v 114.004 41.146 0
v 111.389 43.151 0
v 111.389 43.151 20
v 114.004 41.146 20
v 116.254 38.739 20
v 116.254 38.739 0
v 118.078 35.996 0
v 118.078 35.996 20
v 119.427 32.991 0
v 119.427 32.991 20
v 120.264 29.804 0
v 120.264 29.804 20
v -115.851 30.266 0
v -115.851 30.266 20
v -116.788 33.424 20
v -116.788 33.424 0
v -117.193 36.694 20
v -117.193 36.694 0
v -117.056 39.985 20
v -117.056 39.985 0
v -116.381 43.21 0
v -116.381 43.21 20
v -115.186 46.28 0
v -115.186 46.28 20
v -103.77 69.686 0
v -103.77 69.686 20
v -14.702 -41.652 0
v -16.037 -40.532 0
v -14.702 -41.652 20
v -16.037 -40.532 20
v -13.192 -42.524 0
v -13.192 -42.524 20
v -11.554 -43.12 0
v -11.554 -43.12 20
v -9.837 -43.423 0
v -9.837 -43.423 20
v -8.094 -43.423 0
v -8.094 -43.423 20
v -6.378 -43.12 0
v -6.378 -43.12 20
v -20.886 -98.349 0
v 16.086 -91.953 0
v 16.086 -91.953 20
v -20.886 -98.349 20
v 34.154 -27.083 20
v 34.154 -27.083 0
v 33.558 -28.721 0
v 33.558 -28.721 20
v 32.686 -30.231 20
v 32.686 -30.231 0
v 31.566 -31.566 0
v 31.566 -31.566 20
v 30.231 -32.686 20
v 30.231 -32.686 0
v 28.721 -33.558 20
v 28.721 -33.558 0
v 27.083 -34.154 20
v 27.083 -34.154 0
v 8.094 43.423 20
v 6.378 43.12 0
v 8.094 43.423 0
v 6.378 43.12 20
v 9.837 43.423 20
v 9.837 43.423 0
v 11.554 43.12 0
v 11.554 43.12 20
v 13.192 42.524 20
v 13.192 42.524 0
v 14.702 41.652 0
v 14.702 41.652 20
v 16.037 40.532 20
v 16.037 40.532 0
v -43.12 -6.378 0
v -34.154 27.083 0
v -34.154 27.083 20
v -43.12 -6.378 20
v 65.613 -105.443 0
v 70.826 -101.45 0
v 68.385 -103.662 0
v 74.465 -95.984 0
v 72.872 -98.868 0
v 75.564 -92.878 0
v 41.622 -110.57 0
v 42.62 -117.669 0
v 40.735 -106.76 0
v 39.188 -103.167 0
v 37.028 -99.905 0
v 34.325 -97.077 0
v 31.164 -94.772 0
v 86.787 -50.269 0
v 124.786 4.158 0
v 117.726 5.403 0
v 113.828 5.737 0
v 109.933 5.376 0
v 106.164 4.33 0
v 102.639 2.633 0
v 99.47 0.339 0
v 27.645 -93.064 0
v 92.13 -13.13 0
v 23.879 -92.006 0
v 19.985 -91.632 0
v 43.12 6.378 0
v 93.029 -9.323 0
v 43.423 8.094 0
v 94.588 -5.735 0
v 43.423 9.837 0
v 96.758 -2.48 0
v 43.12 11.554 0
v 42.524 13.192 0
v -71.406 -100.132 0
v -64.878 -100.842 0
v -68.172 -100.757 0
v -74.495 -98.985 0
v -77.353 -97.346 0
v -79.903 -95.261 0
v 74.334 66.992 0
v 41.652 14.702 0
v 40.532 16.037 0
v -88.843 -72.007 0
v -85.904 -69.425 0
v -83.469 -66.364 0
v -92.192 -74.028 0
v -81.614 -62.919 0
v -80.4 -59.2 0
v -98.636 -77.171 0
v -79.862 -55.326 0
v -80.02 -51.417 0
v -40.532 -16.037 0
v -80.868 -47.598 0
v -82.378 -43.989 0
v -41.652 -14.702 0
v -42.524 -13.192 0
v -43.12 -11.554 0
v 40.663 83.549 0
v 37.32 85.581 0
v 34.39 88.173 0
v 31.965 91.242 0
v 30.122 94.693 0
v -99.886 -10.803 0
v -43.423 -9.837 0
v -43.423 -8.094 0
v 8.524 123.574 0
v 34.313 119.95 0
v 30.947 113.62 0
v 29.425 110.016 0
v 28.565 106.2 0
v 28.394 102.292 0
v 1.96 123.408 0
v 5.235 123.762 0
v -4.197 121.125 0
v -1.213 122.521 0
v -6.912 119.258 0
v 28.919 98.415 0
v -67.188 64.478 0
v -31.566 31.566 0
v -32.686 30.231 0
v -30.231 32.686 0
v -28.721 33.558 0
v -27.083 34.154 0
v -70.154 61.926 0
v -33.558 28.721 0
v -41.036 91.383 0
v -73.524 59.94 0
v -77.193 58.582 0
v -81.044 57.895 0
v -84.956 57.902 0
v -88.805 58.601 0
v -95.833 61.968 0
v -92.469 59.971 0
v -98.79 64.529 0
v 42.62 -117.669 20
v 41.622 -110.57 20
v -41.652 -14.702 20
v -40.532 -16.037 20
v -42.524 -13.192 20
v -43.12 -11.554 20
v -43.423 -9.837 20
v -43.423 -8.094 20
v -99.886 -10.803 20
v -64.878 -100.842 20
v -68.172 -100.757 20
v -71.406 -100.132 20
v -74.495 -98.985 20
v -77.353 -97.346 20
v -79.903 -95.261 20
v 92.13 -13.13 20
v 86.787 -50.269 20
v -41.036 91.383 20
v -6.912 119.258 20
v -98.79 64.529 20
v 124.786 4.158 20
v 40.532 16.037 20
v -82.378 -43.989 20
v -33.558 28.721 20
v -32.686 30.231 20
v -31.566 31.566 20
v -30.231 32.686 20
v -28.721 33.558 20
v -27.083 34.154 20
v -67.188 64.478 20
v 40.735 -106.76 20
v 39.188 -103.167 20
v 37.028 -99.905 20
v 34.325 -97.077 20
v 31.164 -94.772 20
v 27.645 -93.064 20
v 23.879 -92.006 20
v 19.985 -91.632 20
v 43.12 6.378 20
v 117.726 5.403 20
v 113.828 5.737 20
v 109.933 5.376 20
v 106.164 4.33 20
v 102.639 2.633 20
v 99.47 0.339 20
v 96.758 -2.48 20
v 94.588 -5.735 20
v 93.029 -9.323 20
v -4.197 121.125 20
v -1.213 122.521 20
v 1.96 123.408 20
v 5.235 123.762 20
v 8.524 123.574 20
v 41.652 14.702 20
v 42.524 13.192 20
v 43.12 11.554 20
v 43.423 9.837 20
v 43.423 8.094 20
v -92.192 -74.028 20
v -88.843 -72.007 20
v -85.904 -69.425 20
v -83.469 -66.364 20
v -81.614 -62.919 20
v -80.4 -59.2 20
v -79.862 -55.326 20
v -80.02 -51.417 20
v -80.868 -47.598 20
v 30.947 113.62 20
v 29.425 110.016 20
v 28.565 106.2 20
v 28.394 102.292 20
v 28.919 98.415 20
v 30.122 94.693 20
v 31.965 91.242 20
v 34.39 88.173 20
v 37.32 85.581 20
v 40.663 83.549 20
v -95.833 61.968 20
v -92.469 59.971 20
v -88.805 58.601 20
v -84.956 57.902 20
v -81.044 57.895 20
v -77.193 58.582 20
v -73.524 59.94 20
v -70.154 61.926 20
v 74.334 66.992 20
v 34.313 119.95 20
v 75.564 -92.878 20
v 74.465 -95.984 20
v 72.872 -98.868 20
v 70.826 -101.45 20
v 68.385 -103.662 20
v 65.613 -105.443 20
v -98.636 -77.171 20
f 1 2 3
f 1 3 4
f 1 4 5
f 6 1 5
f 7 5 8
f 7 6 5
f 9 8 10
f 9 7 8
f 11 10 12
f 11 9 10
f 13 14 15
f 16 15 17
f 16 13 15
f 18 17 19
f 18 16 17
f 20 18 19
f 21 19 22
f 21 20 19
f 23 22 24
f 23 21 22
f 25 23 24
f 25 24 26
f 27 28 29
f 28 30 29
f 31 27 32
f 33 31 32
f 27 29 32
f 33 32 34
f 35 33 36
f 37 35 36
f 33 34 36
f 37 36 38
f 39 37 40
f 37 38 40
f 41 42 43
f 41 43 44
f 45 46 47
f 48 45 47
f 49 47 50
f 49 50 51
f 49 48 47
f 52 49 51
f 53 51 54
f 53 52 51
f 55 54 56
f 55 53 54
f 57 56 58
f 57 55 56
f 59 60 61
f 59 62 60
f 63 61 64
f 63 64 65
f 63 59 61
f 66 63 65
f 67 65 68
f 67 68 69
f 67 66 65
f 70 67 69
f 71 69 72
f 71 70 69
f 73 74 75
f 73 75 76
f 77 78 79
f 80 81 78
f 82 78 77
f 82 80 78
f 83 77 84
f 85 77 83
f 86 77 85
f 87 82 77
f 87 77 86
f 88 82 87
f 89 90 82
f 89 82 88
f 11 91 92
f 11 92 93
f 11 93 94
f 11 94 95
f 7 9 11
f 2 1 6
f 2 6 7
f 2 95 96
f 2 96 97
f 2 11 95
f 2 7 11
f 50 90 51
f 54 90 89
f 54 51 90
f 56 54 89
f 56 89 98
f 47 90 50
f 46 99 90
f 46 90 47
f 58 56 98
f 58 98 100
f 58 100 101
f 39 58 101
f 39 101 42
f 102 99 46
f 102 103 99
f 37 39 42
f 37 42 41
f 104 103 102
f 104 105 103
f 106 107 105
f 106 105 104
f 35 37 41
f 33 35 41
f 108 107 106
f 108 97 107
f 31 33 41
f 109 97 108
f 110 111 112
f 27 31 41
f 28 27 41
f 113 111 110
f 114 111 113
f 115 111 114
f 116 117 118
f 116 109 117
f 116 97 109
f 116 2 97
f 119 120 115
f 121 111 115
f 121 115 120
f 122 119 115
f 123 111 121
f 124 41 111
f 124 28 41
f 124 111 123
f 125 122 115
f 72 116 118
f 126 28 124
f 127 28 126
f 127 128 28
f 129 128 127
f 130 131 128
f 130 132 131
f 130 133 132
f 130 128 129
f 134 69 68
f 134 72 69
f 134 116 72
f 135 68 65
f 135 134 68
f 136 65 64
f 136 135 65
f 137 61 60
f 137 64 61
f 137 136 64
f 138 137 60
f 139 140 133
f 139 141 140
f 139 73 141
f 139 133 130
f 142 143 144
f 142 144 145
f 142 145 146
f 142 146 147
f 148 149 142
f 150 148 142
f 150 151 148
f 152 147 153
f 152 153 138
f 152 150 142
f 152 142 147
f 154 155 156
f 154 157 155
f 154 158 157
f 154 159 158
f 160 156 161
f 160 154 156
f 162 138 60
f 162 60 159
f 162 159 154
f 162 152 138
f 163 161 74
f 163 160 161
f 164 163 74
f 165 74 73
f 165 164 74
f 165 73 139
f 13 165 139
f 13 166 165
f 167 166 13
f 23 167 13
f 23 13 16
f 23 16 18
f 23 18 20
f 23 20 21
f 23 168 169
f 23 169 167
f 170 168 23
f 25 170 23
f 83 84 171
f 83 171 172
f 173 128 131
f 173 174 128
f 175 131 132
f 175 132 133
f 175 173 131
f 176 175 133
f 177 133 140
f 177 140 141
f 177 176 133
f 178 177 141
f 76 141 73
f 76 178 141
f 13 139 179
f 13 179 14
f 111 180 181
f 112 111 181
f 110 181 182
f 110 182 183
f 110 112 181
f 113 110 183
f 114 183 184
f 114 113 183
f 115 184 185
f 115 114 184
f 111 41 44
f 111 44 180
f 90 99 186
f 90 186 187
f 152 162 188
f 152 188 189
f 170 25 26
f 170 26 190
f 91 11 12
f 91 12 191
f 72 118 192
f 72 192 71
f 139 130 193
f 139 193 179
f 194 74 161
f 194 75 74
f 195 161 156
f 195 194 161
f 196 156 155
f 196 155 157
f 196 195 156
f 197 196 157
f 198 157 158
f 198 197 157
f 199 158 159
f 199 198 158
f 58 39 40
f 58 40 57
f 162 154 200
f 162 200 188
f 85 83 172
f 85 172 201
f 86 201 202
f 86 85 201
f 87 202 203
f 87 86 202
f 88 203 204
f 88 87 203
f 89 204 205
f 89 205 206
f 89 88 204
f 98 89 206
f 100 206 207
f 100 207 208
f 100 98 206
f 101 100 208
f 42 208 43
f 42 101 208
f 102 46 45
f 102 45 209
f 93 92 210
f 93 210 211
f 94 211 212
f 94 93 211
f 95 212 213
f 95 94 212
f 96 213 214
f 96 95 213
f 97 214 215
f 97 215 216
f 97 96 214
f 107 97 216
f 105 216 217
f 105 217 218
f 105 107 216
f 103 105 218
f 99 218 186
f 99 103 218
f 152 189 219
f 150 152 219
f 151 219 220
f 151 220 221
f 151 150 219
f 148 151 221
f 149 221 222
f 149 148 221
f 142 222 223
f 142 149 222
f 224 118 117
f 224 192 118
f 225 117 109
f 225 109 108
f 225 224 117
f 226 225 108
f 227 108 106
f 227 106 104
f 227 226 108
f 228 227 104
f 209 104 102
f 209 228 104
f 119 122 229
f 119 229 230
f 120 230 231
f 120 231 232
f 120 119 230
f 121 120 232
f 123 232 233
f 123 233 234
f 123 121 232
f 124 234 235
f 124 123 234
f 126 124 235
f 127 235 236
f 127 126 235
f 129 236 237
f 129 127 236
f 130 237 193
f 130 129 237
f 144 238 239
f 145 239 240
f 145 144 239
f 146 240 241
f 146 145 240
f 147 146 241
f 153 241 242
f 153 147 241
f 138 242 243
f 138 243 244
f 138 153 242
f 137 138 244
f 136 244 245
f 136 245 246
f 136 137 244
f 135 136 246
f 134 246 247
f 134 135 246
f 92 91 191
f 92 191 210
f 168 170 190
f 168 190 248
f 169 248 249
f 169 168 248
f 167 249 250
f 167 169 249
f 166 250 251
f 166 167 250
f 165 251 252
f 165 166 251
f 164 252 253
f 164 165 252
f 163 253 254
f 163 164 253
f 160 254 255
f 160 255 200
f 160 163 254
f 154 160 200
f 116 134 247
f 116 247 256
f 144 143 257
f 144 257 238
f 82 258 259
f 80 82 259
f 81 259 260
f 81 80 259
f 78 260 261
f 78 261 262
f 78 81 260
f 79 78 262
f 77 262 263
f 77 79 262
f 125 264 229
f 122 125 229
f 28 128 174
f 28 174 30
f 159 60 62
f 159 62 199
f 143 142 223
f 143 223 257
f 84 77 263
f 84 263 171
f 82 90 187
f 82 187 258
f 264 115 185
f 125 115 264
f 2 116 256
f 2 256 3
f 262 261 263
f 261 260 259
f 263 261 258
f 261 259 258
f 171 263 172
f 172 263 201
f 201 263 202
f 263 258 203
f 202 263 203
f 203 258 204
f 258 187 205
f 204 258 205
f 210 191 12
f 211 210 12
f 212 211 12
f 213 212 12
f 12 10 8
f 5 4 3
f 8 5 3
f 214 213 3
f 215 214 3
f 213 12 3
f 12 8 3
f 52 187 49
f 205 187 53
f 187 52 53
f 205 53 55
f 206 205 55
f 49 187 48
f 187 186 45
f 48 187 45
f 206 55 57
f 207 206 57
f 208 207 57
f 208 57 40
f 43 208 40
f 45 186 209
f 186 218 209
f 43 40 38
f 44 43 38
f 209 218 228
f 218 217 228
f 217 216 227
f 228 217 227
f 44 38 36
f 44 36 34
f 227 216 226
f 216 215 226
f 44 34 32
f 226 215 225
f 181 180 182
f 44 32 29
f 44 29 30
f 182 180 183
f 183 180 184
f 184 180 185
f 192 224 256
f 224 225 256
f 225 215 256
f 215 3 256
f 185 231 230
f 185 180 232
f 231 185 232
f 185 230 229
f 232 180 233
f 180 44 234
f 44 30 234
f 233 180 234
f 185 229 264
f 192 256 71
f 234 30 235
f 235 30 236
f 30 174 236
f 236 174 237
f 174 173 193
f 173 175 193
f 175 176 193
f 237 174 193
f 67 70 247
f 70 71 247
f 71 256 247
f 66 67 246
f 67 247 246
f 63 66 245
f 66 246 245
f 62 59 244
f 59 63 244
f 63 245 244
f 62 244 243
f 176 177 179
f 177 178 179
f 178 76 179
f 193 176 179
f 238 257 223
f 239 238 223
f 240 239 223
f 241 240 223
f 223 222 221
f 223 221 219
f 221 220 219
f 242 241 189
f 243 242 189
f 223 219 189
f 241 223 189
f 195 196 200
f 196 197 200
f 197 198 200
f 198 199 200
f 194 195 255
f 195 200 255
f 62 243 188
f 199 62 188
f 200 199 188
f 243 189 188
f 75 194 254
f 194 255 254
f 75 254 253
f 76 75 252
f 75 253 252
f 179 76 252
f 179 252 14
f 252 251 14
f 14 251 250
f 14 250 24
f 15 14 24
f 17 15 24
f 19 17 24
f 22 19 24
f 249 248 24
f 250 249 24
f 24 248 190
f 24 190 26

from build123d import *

# Parameters (mm, degrees)
BOSS_EXTRUDE1_DEPTH = 20
FILLET1_R           = 10


with BuildPart() as part:
    # Sketch2 → Boss-Extrude1 (new body)
    with BuildSketch(Plane.XY):
        with BuildLine():
            Line((8.524308176, 123.574202785), (34.312591702, 119.949895893))
            Line((34.312591702, 119.949895893), (30.946870999, 113.619895893))
            ThreePointArc((30.946870999, 113.619895893), (29.437456237, 96.527152904), (40.66334756, 83.549496728))
            Line((40.66334756, 83.549496728), (74.333931823, 66.991594994))
            Line((74.333931823, 66.991594994), (111.389403677, 43.150824518))
            ThreePointArc((111.389403677, 43.150824518), (117.222239734, 37.405423132), (120.264178278, 29.804224315))
            Line((120.264178278, 29.804224315), (124.786275456, 4.158136801))
            Line((124.786275456, 4.158136801), (117.726022813, 5.403049832))
            ThreePointArc((117.726022813, 5.403049832), (101.003423398, 1.556640514), (92.129930121, -13.130132886))
            Line((92.129930121, -13.130132886), (86.787212529, -50.269434484))
            Line((86.787212529, -50.269434484), (75.564062952, -92.878485691))
            ThreePointArc((75.564062952, -92.878485691), (71.902306992, -100.201269099), (65.613148031, -105.443224185))
            Line((65.613148031, -105.443224185), (42.619674262, -117.669071055))
            Line((42.619674262, -117.669071055), (41.621918861, -110.569672489))
            ThreePointArc((41.621918861, -110.569672489), (32.796198806, -95.854141193), (16.086187039, -91.953410163))
            Line((16.086187039, -91.953410163), (-20.886378289, -98.348859135))
            Line((-20.886378289, -98.348859135), (-64.878138042, -100.841930533))
            ThreePointArc((-64.878138042, -100.841930533), (-72.974063741, -99.622258186), (-79.902916283, -95.26076578))
            Line((-79.902916283, -95.26076578), (-98.635761771, -77.170667172))
            Line((-98.635761771, -77.170667172), (-92.192155877, -74.02791059))
            ThreePointArc((-92.192155877, -74.02791059), (-80.924151432, -61.086802768), (-82.37801338, -43.989245011))
            Line((-82.37801338, -43.989245011), (-99.885597812, -10.802548251))
            Line((-99.885597812, -10.802548251), (-115.850850987, 30.265700095))
            ThreePointArc((-115.850850987, 30.265700095), (-117.19265228, 38.342282469), (-115.185759692, 46.279788104))
            Line((-115.185759692, 46.279788104), (-103.76982114, 69.685930773))
            Line((-103.76982114, 69.685930773), (-98.789698287, 64.528862593))
            ThreePointArc((-98.789698287, 64.528862593), (-82.999968499, 57.811375783), (-67.188492831, 64.477516571))
            Line((-67.188492831, 64.477516571), (-41.036209743, 91.383472116))
            Line((-41.036209743, 91.383472116), (-6.911519091, 119.25811685))
            ThreePointArc((-6.911519091, 119.25811685), (0.355127803, 123.030046924), (8.524308176, 123.574202785))
        make_face()
        Polygon((-11.954339629, -44.614202866), (32.659863237, -32.659863237), (44.614202866, 11.954339629), (11.954339629, 44.614202866), (-32.659863237, 32.659863237), (-44.614202866, -11.954339629), align=None, mode=Mode.SUBTRACT)
    extrude(amount=BOSS_EXTRUDE1_DEPTH)

    # Fillet1
    fillet1_edges = [part.edges().sort_by_distance(p)[0] for p in [
        (-44.614202866, -11.954339629, 10),
        (-11.954339629, -44.614202866, 10),
        (32.659863237, -32.659863237, 10),
        (44.614202866, 11.954339629, 10),
        (11.954339629, 44.614202866, 10),
        (-32.659863237, 32.659863237, 10),
    ]]
    fillet(fillet1_edges, radius=FILLET1_R)


solid = part.part
